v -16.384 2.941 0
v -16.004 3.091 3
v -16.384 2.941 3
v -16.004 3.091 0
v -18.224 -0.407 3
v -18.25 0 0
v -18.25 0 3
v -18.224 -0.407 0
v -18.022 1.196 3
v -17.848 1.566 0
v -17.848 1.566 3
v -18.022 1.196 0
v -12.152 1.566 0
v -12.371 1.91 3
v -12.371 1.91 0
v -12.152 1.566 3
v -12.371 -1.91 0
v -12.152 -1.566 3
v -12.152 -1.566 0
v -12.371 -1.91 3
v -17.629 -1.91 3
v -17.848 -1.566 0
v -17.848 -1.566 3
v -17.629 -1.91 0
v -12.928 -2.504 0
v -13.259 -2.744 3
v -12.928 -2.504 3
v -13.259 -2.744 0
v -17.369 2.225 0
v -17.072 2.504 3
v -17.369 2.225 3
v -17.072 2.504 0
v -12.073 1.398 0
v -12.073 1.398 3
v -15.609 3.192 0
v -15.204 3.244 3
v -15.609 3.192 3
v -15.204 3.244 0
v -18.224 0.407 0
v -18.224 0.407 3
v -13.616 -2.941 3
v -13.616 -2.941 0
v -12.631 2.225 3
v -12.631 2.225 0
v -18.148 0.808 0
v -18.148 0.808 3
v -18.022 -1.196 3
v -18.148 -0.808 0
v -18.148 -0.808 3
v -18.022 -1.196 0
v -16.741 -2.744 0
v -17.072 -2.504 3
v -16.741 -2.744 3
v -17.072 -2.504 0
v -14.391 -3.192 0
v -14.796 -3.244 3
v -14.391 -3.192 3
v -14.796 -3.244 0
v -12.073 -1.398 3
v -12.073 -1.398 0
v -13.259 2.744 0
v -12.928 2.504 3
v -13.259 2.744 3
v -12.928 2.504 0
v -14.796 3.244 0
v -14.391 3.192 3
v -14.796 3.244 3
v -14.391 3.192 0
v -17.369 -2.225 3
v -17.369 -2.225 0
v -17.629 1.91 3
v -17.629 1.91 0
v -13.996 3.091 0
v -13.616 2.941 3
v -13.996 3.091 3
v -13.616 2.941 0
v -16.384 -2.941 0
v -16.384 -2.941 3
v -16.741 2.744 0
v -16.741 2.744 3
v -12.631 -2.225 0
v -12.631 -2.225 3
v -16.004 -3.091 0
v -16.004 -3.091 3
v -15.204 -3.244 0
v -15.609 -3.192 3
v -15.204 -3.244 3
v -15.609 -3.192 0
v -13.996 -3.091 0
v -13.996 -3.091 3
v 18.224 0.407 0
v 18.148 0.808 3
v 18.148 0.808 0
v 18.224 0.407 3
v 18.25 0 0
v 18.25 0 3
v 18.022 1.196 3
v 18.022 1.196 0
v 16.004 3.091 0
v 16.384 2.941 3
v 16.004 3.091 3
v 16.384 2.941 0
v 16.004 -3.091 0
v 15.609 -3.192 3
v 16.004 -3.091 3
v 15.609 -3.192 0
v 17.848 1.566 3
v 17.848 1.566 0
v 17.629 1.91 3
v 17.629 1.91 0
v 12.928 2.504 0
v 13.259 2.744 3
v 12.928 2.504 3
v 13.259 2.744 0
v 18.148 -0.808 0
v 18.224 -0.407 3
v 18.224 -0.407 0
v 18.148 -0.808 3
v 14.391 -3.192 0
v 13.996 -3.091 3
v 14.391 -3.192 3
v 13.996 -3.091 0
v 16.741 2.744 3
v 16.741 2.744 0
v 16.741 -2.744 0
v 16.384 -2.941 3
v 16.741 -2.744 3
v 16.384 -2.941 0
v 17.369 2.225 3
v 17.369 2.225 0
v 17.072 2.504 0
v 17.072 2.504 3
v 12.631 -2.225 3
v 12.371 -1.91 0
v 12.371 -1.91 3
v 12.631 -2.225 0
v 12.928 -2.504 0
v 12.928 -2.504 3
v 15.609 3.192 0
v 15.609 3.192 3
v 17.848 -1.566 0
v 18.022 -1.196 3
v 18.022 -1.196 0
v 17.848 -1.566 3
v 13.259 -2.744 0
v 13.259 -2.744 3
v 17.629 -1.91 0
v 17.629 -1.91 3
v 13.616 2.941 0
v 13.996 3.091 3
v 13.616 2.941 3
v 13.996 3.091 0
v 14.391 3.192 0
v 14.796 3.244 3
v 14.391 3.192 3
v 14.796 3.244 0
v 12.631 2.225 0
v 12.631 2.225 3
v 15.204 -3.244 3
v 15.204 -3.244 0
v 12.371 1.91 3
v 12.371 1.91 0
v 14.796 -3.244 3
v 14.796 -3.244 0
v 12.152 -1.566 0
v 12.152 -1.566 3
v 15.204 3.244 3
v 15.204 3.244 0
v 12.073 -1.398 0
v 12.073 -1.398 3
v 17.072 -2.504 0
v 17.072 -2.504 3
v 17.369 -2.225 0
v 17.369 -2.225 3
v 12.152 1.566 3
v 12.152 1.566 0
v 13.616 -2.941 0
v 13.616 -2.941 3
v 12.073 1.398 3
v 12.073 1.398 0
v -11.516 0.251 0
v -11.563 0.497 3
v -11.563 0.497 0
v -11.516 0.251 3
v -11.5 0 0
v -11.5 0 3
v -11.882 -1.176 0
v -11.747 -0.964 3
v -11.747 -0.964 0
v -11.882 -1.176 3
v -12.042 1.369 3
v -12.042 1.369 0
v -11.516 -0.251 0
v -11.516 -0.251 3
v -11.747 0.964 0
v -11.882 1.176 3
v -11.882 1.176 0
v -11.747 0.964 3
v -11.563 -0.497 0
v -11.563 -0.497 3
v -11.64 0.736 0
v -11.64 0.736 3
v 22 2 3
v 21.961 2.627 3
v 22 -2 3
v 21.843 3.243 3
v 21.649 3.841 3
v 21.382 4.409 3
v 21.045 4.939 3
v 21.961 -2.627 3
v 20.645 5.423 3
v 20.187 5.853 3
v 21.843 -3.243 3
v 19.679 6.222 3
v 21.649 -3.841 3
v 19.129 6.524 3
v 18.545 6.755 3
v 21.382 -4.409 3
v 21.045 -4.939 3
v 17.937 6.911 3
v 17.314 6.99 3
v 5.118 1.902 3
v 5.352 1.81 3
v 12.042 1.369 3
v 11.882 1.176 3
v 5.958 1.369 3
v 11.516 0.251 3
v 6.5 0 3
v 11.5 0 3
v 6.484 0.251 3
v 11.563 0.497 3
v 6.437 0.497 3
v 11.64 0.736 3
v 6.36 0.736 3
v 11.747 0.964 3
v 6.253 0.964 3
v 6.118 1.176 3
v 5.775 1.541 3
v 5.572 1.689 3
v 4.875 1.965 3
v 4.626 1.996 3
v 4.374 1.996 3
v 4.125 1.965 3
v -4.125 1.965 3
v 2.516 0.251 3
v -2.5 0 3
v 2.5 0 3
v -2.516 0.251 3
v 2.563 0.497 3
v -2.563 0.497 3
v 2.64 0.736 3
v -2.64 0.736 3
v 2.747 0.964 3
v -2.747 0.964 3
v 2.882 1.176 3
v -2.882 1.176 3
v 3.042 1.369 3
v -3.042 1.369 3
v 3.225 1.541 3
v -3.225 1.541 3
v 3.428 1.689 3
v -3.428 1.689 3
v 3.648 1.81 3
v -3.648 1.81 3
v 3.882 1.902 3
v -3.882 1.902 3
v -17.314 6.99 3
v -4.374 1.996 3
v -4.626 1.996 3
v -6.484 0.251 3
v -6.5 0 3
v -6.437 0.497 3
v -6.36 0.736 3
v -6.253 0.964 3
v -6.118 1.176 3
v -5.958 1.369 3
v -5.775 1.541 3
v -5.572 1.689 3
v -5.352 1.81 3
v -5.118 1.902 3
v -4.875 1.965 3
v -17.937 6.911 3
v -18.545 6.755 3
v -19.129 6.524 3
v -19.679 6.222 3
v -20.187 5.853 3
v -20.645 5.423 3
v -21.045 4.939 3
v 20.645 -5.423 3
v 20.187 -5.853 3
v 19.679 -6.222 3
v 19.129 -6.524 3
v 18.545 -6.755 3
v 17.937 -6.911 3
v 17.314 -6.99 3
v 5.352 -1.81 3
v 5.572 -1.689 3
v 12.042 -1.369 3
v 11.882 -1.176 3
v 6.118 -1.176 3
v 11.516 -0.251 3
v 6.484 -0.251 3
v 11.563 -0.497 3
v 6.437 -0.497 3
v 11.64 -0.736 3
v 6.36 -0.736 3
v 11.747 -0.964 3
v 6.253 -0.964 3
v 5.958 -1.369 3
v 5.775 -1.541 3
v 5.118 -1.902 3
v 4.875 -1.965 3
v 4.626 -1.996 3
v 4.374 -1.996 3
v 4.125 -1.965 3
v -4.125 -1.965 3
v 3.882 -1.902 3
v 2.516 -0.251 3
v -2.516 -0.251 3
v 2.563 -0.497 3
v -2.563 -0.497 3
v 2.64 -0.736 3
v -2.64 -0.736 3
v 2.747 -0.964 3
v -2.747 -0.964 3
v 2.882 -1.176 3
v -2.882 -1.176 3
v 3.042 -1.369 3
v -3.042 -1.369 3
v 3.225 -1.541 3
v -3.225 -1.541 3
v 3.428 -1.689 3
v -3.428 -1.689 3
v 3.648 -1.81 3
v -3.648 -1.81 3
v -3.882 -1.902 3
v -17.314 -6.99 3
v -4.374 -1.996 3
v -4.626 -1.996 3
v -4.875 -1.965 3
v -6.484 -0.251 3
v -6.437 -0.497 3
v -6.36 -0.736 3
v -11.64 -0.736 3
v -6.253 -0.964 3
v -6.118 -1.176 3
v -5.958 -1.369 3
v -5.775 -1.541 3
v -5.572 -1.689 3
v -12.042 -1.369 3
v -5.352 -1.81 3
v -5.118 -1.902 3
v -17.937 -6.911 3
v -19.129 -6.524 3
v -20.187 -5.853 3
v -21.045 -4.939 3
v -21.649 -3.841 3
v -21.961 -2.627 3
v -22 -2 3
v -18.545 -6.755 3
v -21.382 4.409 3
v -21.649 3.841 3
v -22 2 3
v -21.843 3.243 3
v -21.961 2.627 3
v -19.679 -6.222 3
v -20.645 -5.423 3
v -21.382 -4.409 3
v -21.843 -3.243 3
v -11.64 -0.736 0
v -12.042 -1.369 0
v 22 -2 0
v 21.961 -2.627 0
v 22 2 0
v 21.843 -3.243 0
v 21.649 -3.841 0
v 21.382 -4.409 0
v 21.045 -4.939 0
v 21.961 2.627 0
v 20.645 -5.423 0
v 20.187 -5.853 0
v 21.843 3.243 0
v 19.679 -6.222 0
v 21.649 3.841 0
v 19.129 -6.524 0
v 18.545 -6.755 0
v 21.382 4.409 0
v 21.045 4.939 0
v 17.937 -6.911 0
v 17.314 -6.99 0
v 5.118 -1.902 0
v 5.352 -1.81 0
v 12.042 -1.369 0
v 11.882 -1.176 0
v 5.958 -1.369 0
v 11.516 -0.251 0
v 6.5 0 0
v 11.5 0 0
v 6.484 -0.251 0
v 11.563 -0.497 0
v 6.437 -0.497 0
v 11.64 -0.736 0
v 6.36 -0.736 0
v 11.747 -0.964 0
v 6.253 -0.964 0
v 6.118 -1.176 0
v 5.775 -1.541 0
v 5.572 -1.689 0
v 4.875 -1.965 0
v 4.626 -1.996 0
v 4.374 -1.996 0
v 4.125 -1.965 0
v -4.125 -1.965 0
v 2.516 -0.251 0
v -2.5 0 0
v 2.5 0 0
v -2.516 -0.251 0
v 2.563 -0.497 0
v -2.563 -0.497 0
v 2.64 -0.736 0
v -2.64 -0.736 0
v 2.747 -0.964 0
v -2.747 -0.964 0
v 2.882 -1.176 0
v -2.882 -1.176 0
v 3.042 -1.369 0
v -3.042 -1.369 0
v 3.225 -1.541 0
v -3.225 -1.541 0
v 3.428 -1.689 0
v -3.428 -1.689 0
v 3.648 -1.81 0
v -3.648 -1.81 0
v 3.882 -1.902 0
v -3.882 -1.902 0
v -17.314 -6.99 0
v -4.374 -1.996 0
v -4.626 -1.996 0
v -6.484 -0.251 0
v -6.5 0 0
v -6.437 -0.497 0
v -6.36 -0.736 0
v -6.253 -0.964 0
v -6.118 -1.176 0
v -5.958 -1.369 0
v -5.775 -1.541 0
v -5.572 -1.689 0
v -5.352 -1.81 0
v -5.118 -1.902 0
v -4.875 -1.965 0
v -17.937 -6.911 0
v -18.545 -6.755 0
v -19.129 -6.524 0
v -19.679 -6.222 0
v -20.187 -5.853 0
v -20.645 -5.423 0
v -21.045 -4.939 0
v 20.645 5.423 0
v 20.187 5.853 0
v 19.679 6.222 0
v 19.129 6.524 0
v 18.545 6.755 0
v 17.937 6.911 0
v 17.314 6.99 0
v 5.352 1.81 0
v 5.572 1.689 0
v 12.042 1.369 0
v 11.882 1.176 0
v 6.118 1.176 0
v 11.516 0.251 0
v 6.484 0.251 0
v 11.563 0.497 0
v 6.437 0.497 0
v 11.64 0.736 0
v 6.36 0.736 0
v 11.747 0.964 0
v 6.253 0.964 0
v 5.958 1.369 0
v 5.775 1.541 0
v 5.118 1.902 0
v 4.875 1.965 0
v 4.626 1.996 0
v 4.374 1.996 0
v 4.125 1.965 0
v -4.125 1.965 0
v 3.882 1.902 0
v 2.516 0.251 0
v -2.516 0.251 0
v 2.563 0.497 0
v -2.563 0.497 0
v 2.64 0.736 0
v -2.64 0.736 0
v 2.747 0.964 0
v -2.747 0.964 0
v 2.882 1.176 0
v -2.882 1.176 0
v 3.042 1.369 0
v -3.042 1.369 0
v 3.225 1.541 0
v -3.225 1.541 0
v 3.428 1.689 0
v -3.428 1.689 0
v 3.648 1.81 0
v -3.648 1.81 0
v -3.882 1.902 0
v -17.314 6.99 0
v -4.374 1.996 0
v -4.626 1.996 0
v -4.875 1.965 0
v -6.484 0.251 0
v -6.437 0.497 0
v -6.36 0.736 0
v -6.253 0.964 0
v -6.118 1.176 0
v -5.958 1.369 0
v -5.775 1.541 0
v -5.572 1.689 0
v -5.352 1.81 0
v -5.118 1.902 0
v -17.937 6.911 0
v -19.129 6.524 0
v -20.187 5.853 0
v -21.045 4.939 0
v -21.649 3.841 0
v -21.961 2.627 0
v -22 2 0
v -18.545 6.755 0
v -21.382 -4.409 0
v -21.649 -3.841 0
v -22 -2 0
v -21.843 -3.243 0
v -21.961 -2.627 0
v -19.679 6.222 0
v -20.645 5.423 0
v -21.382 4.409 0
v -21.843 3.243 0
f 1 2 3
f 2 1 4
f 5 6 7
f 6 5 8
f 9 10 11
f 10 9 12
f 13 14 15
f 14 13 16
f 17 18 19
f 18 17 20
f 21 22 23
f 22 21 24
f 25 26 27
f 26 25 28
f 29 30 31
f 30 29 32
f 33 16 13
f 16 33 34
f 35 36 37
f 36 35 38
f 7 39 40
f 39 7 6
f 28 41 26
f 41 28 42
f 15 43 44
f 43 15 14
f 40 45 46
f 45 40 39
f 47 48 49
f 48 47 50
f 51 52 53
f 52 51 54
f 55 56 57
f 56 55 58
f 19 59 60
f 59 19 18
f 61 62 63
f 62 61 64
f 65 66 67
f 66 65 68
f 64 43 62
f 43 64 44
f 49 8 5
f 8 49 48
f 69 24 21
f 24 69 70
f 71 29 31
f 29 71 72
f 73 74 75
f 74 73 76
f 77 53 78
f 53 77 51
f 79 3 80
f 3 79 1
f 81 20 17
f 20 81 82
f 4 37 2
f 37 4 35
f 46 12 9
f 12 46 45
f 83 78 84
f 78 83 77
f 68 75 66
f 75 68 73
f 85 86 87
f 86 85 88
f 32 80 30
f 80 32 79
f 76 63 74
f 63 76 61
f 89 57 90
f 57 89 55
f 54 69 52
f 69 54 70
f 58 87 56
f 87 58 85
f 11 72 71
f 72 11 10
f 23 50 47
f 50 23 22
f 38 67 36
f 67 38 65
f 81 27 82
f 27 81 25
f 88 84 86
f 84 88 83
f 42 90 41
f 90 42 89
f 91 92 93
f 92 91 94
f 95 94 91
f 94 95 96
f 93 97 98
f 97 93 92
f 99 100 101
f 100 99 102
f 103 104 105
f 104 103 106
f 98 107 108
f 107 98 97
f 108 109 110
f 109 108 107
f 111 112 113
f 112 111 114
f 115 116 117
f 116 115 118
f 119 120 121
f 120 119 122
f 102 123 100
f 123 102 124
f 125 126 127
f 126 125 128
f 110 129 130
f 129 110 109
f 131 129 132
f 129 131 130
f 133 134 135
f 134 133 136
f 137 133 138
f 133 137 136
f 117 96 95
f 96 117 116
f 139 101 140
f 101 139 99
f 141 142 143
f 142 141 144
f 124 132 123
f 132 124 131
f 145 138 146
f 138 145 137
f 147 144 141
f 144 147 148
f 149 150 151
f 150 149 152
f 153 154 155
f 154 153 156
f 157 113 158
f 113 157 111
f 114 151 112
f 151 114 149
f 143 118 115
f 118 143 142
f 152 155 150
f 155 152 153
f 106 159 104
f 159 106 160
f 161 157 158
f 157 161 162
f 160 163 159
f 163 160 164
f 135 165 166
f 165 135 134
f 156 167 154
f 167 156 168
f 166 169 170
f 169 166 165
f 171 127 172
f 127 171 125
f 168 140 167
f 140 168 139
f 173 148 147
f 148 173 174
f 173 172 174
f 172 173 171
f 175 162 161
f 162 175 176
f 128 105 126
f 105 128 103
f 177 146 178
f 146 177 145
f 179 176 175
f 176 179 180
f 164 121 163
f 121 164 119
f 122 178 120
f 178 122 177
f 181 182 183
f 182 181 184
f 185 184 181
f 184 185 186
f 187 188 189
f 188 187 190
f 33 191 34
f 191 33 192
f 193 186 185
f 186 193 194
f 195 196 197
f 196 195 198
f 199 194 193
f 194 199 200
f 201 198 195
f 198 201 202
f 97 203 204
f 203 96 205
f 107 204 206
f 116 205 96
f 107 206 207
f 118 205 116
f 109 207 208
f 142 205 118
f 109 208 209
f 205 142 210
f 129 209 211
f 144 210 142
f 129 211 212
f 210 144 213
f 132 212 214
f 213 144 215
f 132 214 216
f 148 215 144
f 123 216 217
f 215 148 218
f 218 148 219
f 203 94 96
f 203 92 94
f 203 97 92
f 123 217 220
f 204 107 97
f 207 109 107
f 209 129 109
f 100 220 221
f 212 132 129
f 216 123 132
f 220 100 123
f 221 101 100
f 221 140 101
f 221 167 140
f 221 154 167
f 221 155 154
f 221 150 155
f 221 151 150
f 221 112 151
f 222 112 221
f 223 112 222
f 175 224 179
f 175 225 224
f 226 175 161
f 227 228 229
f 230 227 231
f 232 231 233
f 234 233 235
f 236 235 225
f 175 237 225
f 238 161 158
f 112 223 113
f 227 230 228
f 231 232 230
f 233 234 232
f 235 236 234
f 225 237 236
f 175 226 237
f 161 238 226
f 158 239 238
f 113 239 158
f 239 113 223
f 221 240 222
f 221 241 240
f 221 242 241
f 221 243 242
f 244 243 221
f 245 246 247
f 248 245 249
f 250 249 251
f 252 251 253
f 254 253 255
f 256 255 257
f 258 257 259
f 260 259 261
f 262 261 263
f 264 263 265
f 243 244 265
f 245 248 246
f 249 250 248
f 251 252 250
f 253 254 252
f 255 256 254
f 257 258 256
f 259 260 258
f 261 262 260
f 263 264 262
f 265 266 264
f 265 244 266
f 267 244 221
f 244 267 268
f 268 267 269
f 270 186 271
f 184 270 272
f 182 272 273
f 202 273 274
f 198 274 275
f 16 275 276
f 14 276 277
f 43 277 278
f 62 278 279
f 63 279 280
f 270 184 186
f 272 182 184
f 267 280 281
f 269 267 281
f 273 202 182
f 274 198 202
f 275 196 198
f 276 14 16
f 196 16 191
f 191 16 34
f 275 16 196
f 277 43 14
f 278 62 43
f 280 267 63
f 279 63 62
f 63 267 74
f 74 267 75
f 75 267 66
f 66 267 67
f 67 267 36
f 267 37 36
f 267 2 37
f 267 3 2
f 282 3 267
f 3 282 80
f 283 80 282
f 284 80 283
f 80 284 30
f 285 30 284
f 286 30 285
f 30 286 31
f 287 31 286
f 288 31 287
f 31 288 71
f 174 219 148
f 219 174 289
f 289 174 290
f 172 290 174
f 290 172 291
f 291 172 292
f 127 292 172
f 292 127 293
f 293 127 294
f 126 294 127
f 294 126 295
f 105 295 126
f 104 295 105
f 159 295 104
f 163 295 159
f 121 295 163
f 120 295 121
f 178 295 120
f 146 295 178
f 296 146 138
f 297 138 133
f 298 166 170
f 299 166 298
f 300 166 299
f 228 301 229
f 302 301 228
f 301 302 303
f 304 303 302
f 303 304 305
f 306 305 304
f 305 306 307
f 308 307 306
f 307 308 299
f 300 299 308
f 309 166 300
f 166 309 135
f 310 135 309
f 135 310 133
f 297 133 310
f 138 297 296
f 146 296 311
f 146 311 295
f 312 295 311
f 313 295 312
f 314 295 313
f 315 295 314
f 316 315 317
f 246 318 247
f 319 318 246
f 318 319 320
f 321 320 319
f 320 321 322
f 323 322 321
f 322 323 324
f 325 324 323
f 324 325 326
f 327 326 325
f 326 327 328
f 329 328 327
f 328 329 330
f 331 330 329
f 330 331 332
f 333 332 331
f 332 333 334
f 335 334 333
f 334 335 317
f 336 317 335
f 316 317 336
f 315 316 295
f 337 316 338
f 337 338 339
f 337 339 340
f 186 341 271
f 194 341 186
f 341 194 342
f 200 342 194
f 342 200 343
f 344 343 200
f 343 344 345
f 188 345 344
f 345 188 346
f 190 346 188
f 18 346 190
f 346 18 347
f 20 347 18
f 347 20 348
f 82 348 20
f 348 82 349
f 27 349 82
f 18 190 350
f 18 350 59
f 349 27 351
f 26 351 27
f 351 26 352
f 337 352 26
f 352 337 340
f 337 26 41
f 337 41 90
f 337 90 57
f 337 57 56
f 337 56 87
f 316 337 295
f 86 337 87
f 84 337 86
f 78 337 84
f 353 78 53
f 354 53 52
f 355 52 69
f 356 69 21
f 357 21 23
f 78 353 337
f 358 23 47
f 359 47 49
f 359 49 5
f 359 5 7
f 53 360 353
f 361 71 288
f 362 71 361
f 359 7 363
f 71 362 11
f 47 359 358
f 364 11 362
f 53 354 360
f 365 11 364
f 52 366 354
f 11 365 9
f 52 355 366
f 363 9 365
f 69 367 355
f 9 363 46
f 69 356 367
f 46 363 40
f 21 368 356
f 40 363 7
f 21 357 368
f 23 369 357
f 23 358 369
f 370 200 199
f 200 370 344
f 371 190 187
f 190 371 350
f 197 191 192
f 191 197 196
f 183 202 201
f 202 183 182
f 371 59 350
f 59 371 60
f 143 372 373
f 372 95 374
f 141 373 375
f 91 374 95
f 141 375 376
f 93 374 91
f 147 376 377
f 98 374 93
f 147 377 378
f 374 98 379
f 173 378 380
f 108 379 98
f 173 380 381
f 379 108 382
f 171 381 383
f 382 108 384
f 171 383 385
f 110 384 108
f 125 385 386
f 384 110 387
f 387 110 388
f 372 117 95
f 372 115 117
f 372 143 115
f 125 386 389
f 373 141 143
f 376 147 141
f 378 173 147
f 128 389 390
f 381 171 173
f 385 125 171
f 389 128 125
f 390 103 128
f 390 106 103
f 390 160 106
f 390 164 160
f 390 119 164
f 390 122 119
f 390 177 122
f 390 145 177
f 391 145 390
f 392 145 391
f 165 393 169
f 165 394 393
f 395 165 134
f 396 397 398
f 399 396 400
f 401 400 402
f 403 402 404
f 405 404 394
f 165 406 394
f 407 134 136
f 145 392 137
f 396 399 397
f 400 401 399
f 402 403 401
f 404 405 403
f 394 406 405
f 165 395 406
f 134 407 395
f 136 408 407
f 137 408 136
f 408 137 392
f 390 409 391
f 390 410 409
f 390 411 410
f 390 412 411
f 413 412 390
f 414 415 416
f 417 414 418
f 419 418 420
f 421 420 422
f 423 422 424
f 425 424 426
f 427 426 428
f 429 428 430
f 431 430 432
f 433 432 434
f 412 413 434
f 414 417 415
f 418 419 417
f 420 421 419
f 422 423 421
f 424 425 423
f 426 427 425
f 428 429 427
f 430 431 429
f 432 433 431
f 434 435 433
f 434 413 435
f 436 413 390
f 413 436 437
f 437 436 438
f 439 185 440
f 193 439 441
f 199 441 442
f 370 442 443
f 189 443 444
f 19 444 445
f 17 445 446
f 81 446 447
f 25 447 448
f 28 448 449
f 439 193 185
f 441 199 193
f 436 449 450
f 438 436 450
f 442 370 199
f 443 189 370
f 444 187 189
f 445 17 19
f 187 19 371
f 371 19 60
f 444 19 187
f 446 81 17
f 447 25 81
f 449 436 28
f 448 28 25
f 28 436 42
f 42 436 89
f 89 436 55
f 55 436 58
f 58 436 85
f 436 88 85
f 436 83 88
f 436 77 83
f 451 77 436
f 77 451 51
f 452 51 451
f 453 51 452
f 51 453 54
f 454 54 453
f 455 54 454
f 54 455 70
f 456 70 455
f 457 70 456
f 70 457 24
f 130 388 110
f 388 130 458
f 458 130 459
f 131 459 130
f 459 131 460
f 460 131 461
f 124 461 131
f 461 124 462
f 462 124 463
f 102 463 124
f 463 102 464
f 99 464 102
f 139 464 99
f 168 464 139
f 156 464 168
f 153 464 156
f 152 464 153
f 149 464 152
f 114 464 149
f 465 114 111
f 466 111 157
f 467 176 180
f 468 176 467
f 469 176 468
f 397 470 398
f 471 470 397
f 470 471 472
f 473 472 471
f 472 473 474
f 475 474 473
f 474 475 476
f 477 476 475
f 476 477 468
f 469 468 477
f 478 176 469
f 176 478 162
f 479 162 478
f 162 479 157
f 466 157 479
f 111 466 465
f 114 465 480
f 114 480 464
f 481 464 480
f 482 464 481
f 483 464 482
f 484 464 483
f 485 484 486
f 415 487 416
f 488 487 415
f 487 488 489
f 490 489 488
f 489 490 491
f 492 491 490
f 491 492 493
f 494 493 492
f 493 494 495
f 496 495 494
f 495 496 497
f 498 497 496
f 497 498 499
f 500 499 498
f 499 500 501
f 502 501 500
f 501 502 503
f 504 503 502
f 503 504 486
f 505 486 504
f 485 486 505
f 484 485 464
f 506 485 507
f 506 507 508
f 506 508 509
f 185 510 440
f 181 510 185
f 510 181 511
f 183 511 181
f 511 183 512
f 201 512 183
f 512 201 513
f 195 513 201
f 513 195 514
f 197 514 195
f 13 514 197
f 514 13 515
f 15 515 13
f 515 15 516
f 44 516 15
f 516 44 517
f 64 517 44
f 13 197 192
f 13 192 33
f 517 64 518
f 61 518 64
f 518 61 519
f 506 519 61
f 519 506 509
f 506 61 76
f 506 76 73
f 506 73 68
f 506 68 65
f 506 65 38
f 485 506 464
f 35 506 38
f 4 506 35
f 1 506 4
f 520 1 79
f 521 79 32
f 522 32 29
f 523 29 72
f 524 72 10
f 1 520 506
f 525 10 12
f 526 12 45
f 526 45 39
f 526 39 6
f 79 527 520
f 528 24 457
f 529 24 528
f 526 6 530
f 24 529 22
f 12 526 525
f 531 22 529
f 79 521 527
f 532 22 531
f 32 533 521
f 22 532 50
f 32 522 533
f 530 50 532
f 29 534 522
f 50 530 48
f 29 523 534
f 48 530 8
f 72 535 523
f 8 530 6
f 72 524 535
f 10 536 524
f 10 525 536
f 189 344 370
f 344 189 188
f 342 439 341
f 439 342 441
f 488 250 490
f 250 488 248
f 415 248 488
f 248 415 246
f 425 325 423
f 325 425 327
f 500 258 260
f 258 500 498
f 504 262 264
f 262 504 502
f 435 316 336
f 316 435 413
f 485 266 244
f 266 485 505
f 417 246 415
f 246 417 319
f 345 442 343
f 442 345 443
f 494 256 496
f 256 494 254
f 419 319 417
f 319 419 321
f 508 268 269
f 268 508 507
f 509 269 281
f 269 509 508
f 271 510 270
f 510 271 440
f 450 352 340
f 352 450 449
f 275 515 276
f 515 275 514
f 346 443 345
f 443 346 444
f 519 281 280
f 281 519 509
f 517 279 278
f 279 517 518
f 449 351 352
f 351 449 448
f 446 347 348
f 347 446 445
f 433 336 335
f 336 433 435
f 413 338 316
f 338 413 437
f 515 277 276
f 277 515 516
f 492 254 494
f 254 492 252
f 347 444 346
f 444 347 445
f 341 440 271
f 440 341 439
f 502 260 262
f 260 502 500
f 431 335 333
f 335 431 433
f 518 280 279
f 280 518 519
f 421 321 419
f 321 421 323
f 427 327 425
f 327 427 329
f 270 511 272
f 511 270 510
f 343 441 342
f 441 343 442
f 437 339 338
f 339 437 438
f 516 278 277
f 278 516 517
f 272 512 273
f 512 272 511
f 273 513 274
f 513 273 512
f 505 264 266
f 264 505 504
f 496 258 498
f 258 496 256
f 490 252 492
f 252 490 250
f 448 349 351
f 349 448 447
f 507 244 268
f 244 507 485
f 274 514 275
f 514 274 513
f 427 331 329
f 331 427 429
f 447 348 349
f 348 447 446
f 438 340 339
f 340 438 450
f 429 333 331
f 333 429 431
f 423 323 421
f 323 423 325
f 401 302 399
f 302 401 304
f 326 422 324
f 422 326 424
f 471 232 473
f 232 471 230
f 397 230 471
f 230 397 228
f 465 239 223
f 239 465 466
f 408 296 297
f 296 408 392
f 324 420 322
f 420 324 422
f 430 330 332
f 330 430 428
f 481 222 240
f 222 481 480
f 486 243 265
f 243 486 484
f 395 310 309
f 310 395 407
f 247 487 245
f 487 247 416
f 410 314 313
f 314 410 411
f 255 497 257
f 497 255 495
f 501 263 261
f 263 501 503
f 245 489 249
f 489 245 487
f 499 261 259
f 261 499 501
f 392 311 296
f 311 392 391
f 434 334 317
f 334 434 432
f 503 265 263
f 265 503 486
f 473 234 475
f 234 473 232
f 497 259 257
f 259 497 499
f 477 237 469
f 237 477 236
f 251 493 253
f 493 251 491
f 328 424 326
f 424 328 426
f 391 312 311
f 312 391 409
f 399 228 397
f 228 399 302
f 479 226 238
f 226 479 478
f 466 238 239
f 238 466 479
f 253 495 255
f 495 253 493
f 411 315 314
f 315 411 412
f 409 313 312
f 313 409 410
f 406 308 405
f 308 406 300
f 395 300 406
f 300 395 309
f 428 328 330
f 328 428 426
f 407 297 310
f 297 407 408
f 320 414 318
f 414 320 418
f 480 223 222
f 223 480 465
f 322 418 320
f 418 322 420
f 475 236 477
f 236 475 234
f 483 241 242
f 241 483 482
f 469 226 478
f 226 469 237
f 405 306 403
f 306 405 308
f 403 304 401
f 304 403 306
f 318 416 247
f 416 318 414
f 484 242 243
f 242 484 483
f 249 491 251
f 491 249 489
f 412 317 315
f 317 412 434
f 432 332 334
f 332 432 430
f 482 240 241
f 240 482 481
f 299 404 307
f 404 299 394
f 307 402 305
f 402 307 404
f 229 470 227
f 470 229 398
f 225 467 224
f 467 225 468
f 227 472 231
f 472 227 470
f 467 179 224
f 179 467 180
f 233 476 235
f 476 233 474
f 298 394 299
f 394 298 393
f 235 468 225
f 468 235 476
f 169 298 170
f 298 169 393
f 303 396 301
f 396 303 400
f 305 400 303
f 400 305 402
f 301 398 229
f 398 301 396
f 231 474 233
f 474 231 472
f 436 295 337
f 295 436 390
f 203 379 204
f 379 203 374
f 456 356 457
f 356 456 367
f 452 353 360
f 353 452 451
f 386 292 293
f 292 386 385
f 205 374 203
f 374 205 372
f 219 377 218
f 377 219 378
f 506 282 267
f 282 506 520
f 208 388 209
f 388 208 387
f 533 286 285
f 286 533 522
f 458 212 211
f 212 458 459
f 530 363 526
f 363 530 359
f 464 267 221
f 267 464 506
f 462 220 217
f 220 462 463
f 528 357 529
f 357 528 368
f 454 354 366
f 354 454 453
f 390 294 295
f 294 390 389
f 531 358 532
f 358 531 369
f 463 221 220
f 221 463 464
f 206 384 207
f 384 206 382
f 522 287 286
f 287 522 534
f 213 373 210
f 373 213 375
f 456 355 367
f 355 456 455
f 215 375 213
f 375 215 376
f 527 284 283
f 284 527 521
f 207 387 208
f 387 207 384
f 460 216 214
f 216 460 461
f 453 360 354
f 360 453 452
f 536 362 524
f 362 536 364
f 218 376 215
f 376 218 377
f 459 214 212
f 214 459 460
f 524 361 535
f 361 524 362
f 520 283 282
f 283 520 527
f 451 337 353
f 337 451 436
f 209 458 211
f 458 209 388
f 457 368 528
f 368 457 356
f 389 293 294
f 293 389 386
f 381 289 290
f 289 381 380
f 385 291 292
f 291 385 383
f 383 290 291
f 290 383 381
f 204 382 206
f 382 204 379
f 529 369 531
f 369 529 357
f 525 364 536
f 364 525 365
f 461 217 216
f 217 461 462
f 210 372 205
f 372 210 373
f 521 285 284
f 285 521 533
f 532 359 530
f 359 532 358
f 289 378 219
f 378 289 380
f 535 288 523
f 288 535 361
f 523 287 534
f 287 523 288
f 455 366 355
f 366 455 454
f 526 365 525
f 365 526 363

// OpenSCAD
$fn = 50;

difference() {
	union() {
		hull() {
			translate(v = [-17.0, 2.0, 0]) {
				cylinder(h = 3, r = 5);
			}
			translate(v = [17.0, 2.0, 0]) {
				cylinder(h = 3, r = 5);
			}
			translate(v = [-17.0, -2.0, 0]) {
				cylinder(h = 3, r = 5);
			}
			translate(v = [17.0, -2.0, 0]) {
				cylinder(h = 3, r = 5);
			}
		}
	}
	union() {
		translate(v = [-15.0, 0.0, -100.0]) {
			cylinder(h = 200, r = 3.25);
		}
		translate(v = [15.0, 0.0, -100.0]) {
			cylinder(h = 200, r = 3.25);
		}
		translate(v = [-15.0, 0.0, -100.0]) {
			cylinder(h = 200, r = 1.8);
		}
		translate(v = [15.0, 0.0, -100.0]) {
			cylinder(h = 200, r = 1.8);
		}
		translate(v = [-13.5, 0, 0.0]) {
			cylinder(h = 3, r = 2.0);
		}
		translate(v = [-4.5, 0, 0.0]) {
			cylinder(h = 3, r = 2.0);
		}
		translate(v = [4.5, 0, 0.0]) {
			cylinder(h = 3, r = 2.0);
		}
		translate(v = [13.5, 0, 0.0]) {
			cylinder(h = 3, r = 2.0);
		}
	}
}
